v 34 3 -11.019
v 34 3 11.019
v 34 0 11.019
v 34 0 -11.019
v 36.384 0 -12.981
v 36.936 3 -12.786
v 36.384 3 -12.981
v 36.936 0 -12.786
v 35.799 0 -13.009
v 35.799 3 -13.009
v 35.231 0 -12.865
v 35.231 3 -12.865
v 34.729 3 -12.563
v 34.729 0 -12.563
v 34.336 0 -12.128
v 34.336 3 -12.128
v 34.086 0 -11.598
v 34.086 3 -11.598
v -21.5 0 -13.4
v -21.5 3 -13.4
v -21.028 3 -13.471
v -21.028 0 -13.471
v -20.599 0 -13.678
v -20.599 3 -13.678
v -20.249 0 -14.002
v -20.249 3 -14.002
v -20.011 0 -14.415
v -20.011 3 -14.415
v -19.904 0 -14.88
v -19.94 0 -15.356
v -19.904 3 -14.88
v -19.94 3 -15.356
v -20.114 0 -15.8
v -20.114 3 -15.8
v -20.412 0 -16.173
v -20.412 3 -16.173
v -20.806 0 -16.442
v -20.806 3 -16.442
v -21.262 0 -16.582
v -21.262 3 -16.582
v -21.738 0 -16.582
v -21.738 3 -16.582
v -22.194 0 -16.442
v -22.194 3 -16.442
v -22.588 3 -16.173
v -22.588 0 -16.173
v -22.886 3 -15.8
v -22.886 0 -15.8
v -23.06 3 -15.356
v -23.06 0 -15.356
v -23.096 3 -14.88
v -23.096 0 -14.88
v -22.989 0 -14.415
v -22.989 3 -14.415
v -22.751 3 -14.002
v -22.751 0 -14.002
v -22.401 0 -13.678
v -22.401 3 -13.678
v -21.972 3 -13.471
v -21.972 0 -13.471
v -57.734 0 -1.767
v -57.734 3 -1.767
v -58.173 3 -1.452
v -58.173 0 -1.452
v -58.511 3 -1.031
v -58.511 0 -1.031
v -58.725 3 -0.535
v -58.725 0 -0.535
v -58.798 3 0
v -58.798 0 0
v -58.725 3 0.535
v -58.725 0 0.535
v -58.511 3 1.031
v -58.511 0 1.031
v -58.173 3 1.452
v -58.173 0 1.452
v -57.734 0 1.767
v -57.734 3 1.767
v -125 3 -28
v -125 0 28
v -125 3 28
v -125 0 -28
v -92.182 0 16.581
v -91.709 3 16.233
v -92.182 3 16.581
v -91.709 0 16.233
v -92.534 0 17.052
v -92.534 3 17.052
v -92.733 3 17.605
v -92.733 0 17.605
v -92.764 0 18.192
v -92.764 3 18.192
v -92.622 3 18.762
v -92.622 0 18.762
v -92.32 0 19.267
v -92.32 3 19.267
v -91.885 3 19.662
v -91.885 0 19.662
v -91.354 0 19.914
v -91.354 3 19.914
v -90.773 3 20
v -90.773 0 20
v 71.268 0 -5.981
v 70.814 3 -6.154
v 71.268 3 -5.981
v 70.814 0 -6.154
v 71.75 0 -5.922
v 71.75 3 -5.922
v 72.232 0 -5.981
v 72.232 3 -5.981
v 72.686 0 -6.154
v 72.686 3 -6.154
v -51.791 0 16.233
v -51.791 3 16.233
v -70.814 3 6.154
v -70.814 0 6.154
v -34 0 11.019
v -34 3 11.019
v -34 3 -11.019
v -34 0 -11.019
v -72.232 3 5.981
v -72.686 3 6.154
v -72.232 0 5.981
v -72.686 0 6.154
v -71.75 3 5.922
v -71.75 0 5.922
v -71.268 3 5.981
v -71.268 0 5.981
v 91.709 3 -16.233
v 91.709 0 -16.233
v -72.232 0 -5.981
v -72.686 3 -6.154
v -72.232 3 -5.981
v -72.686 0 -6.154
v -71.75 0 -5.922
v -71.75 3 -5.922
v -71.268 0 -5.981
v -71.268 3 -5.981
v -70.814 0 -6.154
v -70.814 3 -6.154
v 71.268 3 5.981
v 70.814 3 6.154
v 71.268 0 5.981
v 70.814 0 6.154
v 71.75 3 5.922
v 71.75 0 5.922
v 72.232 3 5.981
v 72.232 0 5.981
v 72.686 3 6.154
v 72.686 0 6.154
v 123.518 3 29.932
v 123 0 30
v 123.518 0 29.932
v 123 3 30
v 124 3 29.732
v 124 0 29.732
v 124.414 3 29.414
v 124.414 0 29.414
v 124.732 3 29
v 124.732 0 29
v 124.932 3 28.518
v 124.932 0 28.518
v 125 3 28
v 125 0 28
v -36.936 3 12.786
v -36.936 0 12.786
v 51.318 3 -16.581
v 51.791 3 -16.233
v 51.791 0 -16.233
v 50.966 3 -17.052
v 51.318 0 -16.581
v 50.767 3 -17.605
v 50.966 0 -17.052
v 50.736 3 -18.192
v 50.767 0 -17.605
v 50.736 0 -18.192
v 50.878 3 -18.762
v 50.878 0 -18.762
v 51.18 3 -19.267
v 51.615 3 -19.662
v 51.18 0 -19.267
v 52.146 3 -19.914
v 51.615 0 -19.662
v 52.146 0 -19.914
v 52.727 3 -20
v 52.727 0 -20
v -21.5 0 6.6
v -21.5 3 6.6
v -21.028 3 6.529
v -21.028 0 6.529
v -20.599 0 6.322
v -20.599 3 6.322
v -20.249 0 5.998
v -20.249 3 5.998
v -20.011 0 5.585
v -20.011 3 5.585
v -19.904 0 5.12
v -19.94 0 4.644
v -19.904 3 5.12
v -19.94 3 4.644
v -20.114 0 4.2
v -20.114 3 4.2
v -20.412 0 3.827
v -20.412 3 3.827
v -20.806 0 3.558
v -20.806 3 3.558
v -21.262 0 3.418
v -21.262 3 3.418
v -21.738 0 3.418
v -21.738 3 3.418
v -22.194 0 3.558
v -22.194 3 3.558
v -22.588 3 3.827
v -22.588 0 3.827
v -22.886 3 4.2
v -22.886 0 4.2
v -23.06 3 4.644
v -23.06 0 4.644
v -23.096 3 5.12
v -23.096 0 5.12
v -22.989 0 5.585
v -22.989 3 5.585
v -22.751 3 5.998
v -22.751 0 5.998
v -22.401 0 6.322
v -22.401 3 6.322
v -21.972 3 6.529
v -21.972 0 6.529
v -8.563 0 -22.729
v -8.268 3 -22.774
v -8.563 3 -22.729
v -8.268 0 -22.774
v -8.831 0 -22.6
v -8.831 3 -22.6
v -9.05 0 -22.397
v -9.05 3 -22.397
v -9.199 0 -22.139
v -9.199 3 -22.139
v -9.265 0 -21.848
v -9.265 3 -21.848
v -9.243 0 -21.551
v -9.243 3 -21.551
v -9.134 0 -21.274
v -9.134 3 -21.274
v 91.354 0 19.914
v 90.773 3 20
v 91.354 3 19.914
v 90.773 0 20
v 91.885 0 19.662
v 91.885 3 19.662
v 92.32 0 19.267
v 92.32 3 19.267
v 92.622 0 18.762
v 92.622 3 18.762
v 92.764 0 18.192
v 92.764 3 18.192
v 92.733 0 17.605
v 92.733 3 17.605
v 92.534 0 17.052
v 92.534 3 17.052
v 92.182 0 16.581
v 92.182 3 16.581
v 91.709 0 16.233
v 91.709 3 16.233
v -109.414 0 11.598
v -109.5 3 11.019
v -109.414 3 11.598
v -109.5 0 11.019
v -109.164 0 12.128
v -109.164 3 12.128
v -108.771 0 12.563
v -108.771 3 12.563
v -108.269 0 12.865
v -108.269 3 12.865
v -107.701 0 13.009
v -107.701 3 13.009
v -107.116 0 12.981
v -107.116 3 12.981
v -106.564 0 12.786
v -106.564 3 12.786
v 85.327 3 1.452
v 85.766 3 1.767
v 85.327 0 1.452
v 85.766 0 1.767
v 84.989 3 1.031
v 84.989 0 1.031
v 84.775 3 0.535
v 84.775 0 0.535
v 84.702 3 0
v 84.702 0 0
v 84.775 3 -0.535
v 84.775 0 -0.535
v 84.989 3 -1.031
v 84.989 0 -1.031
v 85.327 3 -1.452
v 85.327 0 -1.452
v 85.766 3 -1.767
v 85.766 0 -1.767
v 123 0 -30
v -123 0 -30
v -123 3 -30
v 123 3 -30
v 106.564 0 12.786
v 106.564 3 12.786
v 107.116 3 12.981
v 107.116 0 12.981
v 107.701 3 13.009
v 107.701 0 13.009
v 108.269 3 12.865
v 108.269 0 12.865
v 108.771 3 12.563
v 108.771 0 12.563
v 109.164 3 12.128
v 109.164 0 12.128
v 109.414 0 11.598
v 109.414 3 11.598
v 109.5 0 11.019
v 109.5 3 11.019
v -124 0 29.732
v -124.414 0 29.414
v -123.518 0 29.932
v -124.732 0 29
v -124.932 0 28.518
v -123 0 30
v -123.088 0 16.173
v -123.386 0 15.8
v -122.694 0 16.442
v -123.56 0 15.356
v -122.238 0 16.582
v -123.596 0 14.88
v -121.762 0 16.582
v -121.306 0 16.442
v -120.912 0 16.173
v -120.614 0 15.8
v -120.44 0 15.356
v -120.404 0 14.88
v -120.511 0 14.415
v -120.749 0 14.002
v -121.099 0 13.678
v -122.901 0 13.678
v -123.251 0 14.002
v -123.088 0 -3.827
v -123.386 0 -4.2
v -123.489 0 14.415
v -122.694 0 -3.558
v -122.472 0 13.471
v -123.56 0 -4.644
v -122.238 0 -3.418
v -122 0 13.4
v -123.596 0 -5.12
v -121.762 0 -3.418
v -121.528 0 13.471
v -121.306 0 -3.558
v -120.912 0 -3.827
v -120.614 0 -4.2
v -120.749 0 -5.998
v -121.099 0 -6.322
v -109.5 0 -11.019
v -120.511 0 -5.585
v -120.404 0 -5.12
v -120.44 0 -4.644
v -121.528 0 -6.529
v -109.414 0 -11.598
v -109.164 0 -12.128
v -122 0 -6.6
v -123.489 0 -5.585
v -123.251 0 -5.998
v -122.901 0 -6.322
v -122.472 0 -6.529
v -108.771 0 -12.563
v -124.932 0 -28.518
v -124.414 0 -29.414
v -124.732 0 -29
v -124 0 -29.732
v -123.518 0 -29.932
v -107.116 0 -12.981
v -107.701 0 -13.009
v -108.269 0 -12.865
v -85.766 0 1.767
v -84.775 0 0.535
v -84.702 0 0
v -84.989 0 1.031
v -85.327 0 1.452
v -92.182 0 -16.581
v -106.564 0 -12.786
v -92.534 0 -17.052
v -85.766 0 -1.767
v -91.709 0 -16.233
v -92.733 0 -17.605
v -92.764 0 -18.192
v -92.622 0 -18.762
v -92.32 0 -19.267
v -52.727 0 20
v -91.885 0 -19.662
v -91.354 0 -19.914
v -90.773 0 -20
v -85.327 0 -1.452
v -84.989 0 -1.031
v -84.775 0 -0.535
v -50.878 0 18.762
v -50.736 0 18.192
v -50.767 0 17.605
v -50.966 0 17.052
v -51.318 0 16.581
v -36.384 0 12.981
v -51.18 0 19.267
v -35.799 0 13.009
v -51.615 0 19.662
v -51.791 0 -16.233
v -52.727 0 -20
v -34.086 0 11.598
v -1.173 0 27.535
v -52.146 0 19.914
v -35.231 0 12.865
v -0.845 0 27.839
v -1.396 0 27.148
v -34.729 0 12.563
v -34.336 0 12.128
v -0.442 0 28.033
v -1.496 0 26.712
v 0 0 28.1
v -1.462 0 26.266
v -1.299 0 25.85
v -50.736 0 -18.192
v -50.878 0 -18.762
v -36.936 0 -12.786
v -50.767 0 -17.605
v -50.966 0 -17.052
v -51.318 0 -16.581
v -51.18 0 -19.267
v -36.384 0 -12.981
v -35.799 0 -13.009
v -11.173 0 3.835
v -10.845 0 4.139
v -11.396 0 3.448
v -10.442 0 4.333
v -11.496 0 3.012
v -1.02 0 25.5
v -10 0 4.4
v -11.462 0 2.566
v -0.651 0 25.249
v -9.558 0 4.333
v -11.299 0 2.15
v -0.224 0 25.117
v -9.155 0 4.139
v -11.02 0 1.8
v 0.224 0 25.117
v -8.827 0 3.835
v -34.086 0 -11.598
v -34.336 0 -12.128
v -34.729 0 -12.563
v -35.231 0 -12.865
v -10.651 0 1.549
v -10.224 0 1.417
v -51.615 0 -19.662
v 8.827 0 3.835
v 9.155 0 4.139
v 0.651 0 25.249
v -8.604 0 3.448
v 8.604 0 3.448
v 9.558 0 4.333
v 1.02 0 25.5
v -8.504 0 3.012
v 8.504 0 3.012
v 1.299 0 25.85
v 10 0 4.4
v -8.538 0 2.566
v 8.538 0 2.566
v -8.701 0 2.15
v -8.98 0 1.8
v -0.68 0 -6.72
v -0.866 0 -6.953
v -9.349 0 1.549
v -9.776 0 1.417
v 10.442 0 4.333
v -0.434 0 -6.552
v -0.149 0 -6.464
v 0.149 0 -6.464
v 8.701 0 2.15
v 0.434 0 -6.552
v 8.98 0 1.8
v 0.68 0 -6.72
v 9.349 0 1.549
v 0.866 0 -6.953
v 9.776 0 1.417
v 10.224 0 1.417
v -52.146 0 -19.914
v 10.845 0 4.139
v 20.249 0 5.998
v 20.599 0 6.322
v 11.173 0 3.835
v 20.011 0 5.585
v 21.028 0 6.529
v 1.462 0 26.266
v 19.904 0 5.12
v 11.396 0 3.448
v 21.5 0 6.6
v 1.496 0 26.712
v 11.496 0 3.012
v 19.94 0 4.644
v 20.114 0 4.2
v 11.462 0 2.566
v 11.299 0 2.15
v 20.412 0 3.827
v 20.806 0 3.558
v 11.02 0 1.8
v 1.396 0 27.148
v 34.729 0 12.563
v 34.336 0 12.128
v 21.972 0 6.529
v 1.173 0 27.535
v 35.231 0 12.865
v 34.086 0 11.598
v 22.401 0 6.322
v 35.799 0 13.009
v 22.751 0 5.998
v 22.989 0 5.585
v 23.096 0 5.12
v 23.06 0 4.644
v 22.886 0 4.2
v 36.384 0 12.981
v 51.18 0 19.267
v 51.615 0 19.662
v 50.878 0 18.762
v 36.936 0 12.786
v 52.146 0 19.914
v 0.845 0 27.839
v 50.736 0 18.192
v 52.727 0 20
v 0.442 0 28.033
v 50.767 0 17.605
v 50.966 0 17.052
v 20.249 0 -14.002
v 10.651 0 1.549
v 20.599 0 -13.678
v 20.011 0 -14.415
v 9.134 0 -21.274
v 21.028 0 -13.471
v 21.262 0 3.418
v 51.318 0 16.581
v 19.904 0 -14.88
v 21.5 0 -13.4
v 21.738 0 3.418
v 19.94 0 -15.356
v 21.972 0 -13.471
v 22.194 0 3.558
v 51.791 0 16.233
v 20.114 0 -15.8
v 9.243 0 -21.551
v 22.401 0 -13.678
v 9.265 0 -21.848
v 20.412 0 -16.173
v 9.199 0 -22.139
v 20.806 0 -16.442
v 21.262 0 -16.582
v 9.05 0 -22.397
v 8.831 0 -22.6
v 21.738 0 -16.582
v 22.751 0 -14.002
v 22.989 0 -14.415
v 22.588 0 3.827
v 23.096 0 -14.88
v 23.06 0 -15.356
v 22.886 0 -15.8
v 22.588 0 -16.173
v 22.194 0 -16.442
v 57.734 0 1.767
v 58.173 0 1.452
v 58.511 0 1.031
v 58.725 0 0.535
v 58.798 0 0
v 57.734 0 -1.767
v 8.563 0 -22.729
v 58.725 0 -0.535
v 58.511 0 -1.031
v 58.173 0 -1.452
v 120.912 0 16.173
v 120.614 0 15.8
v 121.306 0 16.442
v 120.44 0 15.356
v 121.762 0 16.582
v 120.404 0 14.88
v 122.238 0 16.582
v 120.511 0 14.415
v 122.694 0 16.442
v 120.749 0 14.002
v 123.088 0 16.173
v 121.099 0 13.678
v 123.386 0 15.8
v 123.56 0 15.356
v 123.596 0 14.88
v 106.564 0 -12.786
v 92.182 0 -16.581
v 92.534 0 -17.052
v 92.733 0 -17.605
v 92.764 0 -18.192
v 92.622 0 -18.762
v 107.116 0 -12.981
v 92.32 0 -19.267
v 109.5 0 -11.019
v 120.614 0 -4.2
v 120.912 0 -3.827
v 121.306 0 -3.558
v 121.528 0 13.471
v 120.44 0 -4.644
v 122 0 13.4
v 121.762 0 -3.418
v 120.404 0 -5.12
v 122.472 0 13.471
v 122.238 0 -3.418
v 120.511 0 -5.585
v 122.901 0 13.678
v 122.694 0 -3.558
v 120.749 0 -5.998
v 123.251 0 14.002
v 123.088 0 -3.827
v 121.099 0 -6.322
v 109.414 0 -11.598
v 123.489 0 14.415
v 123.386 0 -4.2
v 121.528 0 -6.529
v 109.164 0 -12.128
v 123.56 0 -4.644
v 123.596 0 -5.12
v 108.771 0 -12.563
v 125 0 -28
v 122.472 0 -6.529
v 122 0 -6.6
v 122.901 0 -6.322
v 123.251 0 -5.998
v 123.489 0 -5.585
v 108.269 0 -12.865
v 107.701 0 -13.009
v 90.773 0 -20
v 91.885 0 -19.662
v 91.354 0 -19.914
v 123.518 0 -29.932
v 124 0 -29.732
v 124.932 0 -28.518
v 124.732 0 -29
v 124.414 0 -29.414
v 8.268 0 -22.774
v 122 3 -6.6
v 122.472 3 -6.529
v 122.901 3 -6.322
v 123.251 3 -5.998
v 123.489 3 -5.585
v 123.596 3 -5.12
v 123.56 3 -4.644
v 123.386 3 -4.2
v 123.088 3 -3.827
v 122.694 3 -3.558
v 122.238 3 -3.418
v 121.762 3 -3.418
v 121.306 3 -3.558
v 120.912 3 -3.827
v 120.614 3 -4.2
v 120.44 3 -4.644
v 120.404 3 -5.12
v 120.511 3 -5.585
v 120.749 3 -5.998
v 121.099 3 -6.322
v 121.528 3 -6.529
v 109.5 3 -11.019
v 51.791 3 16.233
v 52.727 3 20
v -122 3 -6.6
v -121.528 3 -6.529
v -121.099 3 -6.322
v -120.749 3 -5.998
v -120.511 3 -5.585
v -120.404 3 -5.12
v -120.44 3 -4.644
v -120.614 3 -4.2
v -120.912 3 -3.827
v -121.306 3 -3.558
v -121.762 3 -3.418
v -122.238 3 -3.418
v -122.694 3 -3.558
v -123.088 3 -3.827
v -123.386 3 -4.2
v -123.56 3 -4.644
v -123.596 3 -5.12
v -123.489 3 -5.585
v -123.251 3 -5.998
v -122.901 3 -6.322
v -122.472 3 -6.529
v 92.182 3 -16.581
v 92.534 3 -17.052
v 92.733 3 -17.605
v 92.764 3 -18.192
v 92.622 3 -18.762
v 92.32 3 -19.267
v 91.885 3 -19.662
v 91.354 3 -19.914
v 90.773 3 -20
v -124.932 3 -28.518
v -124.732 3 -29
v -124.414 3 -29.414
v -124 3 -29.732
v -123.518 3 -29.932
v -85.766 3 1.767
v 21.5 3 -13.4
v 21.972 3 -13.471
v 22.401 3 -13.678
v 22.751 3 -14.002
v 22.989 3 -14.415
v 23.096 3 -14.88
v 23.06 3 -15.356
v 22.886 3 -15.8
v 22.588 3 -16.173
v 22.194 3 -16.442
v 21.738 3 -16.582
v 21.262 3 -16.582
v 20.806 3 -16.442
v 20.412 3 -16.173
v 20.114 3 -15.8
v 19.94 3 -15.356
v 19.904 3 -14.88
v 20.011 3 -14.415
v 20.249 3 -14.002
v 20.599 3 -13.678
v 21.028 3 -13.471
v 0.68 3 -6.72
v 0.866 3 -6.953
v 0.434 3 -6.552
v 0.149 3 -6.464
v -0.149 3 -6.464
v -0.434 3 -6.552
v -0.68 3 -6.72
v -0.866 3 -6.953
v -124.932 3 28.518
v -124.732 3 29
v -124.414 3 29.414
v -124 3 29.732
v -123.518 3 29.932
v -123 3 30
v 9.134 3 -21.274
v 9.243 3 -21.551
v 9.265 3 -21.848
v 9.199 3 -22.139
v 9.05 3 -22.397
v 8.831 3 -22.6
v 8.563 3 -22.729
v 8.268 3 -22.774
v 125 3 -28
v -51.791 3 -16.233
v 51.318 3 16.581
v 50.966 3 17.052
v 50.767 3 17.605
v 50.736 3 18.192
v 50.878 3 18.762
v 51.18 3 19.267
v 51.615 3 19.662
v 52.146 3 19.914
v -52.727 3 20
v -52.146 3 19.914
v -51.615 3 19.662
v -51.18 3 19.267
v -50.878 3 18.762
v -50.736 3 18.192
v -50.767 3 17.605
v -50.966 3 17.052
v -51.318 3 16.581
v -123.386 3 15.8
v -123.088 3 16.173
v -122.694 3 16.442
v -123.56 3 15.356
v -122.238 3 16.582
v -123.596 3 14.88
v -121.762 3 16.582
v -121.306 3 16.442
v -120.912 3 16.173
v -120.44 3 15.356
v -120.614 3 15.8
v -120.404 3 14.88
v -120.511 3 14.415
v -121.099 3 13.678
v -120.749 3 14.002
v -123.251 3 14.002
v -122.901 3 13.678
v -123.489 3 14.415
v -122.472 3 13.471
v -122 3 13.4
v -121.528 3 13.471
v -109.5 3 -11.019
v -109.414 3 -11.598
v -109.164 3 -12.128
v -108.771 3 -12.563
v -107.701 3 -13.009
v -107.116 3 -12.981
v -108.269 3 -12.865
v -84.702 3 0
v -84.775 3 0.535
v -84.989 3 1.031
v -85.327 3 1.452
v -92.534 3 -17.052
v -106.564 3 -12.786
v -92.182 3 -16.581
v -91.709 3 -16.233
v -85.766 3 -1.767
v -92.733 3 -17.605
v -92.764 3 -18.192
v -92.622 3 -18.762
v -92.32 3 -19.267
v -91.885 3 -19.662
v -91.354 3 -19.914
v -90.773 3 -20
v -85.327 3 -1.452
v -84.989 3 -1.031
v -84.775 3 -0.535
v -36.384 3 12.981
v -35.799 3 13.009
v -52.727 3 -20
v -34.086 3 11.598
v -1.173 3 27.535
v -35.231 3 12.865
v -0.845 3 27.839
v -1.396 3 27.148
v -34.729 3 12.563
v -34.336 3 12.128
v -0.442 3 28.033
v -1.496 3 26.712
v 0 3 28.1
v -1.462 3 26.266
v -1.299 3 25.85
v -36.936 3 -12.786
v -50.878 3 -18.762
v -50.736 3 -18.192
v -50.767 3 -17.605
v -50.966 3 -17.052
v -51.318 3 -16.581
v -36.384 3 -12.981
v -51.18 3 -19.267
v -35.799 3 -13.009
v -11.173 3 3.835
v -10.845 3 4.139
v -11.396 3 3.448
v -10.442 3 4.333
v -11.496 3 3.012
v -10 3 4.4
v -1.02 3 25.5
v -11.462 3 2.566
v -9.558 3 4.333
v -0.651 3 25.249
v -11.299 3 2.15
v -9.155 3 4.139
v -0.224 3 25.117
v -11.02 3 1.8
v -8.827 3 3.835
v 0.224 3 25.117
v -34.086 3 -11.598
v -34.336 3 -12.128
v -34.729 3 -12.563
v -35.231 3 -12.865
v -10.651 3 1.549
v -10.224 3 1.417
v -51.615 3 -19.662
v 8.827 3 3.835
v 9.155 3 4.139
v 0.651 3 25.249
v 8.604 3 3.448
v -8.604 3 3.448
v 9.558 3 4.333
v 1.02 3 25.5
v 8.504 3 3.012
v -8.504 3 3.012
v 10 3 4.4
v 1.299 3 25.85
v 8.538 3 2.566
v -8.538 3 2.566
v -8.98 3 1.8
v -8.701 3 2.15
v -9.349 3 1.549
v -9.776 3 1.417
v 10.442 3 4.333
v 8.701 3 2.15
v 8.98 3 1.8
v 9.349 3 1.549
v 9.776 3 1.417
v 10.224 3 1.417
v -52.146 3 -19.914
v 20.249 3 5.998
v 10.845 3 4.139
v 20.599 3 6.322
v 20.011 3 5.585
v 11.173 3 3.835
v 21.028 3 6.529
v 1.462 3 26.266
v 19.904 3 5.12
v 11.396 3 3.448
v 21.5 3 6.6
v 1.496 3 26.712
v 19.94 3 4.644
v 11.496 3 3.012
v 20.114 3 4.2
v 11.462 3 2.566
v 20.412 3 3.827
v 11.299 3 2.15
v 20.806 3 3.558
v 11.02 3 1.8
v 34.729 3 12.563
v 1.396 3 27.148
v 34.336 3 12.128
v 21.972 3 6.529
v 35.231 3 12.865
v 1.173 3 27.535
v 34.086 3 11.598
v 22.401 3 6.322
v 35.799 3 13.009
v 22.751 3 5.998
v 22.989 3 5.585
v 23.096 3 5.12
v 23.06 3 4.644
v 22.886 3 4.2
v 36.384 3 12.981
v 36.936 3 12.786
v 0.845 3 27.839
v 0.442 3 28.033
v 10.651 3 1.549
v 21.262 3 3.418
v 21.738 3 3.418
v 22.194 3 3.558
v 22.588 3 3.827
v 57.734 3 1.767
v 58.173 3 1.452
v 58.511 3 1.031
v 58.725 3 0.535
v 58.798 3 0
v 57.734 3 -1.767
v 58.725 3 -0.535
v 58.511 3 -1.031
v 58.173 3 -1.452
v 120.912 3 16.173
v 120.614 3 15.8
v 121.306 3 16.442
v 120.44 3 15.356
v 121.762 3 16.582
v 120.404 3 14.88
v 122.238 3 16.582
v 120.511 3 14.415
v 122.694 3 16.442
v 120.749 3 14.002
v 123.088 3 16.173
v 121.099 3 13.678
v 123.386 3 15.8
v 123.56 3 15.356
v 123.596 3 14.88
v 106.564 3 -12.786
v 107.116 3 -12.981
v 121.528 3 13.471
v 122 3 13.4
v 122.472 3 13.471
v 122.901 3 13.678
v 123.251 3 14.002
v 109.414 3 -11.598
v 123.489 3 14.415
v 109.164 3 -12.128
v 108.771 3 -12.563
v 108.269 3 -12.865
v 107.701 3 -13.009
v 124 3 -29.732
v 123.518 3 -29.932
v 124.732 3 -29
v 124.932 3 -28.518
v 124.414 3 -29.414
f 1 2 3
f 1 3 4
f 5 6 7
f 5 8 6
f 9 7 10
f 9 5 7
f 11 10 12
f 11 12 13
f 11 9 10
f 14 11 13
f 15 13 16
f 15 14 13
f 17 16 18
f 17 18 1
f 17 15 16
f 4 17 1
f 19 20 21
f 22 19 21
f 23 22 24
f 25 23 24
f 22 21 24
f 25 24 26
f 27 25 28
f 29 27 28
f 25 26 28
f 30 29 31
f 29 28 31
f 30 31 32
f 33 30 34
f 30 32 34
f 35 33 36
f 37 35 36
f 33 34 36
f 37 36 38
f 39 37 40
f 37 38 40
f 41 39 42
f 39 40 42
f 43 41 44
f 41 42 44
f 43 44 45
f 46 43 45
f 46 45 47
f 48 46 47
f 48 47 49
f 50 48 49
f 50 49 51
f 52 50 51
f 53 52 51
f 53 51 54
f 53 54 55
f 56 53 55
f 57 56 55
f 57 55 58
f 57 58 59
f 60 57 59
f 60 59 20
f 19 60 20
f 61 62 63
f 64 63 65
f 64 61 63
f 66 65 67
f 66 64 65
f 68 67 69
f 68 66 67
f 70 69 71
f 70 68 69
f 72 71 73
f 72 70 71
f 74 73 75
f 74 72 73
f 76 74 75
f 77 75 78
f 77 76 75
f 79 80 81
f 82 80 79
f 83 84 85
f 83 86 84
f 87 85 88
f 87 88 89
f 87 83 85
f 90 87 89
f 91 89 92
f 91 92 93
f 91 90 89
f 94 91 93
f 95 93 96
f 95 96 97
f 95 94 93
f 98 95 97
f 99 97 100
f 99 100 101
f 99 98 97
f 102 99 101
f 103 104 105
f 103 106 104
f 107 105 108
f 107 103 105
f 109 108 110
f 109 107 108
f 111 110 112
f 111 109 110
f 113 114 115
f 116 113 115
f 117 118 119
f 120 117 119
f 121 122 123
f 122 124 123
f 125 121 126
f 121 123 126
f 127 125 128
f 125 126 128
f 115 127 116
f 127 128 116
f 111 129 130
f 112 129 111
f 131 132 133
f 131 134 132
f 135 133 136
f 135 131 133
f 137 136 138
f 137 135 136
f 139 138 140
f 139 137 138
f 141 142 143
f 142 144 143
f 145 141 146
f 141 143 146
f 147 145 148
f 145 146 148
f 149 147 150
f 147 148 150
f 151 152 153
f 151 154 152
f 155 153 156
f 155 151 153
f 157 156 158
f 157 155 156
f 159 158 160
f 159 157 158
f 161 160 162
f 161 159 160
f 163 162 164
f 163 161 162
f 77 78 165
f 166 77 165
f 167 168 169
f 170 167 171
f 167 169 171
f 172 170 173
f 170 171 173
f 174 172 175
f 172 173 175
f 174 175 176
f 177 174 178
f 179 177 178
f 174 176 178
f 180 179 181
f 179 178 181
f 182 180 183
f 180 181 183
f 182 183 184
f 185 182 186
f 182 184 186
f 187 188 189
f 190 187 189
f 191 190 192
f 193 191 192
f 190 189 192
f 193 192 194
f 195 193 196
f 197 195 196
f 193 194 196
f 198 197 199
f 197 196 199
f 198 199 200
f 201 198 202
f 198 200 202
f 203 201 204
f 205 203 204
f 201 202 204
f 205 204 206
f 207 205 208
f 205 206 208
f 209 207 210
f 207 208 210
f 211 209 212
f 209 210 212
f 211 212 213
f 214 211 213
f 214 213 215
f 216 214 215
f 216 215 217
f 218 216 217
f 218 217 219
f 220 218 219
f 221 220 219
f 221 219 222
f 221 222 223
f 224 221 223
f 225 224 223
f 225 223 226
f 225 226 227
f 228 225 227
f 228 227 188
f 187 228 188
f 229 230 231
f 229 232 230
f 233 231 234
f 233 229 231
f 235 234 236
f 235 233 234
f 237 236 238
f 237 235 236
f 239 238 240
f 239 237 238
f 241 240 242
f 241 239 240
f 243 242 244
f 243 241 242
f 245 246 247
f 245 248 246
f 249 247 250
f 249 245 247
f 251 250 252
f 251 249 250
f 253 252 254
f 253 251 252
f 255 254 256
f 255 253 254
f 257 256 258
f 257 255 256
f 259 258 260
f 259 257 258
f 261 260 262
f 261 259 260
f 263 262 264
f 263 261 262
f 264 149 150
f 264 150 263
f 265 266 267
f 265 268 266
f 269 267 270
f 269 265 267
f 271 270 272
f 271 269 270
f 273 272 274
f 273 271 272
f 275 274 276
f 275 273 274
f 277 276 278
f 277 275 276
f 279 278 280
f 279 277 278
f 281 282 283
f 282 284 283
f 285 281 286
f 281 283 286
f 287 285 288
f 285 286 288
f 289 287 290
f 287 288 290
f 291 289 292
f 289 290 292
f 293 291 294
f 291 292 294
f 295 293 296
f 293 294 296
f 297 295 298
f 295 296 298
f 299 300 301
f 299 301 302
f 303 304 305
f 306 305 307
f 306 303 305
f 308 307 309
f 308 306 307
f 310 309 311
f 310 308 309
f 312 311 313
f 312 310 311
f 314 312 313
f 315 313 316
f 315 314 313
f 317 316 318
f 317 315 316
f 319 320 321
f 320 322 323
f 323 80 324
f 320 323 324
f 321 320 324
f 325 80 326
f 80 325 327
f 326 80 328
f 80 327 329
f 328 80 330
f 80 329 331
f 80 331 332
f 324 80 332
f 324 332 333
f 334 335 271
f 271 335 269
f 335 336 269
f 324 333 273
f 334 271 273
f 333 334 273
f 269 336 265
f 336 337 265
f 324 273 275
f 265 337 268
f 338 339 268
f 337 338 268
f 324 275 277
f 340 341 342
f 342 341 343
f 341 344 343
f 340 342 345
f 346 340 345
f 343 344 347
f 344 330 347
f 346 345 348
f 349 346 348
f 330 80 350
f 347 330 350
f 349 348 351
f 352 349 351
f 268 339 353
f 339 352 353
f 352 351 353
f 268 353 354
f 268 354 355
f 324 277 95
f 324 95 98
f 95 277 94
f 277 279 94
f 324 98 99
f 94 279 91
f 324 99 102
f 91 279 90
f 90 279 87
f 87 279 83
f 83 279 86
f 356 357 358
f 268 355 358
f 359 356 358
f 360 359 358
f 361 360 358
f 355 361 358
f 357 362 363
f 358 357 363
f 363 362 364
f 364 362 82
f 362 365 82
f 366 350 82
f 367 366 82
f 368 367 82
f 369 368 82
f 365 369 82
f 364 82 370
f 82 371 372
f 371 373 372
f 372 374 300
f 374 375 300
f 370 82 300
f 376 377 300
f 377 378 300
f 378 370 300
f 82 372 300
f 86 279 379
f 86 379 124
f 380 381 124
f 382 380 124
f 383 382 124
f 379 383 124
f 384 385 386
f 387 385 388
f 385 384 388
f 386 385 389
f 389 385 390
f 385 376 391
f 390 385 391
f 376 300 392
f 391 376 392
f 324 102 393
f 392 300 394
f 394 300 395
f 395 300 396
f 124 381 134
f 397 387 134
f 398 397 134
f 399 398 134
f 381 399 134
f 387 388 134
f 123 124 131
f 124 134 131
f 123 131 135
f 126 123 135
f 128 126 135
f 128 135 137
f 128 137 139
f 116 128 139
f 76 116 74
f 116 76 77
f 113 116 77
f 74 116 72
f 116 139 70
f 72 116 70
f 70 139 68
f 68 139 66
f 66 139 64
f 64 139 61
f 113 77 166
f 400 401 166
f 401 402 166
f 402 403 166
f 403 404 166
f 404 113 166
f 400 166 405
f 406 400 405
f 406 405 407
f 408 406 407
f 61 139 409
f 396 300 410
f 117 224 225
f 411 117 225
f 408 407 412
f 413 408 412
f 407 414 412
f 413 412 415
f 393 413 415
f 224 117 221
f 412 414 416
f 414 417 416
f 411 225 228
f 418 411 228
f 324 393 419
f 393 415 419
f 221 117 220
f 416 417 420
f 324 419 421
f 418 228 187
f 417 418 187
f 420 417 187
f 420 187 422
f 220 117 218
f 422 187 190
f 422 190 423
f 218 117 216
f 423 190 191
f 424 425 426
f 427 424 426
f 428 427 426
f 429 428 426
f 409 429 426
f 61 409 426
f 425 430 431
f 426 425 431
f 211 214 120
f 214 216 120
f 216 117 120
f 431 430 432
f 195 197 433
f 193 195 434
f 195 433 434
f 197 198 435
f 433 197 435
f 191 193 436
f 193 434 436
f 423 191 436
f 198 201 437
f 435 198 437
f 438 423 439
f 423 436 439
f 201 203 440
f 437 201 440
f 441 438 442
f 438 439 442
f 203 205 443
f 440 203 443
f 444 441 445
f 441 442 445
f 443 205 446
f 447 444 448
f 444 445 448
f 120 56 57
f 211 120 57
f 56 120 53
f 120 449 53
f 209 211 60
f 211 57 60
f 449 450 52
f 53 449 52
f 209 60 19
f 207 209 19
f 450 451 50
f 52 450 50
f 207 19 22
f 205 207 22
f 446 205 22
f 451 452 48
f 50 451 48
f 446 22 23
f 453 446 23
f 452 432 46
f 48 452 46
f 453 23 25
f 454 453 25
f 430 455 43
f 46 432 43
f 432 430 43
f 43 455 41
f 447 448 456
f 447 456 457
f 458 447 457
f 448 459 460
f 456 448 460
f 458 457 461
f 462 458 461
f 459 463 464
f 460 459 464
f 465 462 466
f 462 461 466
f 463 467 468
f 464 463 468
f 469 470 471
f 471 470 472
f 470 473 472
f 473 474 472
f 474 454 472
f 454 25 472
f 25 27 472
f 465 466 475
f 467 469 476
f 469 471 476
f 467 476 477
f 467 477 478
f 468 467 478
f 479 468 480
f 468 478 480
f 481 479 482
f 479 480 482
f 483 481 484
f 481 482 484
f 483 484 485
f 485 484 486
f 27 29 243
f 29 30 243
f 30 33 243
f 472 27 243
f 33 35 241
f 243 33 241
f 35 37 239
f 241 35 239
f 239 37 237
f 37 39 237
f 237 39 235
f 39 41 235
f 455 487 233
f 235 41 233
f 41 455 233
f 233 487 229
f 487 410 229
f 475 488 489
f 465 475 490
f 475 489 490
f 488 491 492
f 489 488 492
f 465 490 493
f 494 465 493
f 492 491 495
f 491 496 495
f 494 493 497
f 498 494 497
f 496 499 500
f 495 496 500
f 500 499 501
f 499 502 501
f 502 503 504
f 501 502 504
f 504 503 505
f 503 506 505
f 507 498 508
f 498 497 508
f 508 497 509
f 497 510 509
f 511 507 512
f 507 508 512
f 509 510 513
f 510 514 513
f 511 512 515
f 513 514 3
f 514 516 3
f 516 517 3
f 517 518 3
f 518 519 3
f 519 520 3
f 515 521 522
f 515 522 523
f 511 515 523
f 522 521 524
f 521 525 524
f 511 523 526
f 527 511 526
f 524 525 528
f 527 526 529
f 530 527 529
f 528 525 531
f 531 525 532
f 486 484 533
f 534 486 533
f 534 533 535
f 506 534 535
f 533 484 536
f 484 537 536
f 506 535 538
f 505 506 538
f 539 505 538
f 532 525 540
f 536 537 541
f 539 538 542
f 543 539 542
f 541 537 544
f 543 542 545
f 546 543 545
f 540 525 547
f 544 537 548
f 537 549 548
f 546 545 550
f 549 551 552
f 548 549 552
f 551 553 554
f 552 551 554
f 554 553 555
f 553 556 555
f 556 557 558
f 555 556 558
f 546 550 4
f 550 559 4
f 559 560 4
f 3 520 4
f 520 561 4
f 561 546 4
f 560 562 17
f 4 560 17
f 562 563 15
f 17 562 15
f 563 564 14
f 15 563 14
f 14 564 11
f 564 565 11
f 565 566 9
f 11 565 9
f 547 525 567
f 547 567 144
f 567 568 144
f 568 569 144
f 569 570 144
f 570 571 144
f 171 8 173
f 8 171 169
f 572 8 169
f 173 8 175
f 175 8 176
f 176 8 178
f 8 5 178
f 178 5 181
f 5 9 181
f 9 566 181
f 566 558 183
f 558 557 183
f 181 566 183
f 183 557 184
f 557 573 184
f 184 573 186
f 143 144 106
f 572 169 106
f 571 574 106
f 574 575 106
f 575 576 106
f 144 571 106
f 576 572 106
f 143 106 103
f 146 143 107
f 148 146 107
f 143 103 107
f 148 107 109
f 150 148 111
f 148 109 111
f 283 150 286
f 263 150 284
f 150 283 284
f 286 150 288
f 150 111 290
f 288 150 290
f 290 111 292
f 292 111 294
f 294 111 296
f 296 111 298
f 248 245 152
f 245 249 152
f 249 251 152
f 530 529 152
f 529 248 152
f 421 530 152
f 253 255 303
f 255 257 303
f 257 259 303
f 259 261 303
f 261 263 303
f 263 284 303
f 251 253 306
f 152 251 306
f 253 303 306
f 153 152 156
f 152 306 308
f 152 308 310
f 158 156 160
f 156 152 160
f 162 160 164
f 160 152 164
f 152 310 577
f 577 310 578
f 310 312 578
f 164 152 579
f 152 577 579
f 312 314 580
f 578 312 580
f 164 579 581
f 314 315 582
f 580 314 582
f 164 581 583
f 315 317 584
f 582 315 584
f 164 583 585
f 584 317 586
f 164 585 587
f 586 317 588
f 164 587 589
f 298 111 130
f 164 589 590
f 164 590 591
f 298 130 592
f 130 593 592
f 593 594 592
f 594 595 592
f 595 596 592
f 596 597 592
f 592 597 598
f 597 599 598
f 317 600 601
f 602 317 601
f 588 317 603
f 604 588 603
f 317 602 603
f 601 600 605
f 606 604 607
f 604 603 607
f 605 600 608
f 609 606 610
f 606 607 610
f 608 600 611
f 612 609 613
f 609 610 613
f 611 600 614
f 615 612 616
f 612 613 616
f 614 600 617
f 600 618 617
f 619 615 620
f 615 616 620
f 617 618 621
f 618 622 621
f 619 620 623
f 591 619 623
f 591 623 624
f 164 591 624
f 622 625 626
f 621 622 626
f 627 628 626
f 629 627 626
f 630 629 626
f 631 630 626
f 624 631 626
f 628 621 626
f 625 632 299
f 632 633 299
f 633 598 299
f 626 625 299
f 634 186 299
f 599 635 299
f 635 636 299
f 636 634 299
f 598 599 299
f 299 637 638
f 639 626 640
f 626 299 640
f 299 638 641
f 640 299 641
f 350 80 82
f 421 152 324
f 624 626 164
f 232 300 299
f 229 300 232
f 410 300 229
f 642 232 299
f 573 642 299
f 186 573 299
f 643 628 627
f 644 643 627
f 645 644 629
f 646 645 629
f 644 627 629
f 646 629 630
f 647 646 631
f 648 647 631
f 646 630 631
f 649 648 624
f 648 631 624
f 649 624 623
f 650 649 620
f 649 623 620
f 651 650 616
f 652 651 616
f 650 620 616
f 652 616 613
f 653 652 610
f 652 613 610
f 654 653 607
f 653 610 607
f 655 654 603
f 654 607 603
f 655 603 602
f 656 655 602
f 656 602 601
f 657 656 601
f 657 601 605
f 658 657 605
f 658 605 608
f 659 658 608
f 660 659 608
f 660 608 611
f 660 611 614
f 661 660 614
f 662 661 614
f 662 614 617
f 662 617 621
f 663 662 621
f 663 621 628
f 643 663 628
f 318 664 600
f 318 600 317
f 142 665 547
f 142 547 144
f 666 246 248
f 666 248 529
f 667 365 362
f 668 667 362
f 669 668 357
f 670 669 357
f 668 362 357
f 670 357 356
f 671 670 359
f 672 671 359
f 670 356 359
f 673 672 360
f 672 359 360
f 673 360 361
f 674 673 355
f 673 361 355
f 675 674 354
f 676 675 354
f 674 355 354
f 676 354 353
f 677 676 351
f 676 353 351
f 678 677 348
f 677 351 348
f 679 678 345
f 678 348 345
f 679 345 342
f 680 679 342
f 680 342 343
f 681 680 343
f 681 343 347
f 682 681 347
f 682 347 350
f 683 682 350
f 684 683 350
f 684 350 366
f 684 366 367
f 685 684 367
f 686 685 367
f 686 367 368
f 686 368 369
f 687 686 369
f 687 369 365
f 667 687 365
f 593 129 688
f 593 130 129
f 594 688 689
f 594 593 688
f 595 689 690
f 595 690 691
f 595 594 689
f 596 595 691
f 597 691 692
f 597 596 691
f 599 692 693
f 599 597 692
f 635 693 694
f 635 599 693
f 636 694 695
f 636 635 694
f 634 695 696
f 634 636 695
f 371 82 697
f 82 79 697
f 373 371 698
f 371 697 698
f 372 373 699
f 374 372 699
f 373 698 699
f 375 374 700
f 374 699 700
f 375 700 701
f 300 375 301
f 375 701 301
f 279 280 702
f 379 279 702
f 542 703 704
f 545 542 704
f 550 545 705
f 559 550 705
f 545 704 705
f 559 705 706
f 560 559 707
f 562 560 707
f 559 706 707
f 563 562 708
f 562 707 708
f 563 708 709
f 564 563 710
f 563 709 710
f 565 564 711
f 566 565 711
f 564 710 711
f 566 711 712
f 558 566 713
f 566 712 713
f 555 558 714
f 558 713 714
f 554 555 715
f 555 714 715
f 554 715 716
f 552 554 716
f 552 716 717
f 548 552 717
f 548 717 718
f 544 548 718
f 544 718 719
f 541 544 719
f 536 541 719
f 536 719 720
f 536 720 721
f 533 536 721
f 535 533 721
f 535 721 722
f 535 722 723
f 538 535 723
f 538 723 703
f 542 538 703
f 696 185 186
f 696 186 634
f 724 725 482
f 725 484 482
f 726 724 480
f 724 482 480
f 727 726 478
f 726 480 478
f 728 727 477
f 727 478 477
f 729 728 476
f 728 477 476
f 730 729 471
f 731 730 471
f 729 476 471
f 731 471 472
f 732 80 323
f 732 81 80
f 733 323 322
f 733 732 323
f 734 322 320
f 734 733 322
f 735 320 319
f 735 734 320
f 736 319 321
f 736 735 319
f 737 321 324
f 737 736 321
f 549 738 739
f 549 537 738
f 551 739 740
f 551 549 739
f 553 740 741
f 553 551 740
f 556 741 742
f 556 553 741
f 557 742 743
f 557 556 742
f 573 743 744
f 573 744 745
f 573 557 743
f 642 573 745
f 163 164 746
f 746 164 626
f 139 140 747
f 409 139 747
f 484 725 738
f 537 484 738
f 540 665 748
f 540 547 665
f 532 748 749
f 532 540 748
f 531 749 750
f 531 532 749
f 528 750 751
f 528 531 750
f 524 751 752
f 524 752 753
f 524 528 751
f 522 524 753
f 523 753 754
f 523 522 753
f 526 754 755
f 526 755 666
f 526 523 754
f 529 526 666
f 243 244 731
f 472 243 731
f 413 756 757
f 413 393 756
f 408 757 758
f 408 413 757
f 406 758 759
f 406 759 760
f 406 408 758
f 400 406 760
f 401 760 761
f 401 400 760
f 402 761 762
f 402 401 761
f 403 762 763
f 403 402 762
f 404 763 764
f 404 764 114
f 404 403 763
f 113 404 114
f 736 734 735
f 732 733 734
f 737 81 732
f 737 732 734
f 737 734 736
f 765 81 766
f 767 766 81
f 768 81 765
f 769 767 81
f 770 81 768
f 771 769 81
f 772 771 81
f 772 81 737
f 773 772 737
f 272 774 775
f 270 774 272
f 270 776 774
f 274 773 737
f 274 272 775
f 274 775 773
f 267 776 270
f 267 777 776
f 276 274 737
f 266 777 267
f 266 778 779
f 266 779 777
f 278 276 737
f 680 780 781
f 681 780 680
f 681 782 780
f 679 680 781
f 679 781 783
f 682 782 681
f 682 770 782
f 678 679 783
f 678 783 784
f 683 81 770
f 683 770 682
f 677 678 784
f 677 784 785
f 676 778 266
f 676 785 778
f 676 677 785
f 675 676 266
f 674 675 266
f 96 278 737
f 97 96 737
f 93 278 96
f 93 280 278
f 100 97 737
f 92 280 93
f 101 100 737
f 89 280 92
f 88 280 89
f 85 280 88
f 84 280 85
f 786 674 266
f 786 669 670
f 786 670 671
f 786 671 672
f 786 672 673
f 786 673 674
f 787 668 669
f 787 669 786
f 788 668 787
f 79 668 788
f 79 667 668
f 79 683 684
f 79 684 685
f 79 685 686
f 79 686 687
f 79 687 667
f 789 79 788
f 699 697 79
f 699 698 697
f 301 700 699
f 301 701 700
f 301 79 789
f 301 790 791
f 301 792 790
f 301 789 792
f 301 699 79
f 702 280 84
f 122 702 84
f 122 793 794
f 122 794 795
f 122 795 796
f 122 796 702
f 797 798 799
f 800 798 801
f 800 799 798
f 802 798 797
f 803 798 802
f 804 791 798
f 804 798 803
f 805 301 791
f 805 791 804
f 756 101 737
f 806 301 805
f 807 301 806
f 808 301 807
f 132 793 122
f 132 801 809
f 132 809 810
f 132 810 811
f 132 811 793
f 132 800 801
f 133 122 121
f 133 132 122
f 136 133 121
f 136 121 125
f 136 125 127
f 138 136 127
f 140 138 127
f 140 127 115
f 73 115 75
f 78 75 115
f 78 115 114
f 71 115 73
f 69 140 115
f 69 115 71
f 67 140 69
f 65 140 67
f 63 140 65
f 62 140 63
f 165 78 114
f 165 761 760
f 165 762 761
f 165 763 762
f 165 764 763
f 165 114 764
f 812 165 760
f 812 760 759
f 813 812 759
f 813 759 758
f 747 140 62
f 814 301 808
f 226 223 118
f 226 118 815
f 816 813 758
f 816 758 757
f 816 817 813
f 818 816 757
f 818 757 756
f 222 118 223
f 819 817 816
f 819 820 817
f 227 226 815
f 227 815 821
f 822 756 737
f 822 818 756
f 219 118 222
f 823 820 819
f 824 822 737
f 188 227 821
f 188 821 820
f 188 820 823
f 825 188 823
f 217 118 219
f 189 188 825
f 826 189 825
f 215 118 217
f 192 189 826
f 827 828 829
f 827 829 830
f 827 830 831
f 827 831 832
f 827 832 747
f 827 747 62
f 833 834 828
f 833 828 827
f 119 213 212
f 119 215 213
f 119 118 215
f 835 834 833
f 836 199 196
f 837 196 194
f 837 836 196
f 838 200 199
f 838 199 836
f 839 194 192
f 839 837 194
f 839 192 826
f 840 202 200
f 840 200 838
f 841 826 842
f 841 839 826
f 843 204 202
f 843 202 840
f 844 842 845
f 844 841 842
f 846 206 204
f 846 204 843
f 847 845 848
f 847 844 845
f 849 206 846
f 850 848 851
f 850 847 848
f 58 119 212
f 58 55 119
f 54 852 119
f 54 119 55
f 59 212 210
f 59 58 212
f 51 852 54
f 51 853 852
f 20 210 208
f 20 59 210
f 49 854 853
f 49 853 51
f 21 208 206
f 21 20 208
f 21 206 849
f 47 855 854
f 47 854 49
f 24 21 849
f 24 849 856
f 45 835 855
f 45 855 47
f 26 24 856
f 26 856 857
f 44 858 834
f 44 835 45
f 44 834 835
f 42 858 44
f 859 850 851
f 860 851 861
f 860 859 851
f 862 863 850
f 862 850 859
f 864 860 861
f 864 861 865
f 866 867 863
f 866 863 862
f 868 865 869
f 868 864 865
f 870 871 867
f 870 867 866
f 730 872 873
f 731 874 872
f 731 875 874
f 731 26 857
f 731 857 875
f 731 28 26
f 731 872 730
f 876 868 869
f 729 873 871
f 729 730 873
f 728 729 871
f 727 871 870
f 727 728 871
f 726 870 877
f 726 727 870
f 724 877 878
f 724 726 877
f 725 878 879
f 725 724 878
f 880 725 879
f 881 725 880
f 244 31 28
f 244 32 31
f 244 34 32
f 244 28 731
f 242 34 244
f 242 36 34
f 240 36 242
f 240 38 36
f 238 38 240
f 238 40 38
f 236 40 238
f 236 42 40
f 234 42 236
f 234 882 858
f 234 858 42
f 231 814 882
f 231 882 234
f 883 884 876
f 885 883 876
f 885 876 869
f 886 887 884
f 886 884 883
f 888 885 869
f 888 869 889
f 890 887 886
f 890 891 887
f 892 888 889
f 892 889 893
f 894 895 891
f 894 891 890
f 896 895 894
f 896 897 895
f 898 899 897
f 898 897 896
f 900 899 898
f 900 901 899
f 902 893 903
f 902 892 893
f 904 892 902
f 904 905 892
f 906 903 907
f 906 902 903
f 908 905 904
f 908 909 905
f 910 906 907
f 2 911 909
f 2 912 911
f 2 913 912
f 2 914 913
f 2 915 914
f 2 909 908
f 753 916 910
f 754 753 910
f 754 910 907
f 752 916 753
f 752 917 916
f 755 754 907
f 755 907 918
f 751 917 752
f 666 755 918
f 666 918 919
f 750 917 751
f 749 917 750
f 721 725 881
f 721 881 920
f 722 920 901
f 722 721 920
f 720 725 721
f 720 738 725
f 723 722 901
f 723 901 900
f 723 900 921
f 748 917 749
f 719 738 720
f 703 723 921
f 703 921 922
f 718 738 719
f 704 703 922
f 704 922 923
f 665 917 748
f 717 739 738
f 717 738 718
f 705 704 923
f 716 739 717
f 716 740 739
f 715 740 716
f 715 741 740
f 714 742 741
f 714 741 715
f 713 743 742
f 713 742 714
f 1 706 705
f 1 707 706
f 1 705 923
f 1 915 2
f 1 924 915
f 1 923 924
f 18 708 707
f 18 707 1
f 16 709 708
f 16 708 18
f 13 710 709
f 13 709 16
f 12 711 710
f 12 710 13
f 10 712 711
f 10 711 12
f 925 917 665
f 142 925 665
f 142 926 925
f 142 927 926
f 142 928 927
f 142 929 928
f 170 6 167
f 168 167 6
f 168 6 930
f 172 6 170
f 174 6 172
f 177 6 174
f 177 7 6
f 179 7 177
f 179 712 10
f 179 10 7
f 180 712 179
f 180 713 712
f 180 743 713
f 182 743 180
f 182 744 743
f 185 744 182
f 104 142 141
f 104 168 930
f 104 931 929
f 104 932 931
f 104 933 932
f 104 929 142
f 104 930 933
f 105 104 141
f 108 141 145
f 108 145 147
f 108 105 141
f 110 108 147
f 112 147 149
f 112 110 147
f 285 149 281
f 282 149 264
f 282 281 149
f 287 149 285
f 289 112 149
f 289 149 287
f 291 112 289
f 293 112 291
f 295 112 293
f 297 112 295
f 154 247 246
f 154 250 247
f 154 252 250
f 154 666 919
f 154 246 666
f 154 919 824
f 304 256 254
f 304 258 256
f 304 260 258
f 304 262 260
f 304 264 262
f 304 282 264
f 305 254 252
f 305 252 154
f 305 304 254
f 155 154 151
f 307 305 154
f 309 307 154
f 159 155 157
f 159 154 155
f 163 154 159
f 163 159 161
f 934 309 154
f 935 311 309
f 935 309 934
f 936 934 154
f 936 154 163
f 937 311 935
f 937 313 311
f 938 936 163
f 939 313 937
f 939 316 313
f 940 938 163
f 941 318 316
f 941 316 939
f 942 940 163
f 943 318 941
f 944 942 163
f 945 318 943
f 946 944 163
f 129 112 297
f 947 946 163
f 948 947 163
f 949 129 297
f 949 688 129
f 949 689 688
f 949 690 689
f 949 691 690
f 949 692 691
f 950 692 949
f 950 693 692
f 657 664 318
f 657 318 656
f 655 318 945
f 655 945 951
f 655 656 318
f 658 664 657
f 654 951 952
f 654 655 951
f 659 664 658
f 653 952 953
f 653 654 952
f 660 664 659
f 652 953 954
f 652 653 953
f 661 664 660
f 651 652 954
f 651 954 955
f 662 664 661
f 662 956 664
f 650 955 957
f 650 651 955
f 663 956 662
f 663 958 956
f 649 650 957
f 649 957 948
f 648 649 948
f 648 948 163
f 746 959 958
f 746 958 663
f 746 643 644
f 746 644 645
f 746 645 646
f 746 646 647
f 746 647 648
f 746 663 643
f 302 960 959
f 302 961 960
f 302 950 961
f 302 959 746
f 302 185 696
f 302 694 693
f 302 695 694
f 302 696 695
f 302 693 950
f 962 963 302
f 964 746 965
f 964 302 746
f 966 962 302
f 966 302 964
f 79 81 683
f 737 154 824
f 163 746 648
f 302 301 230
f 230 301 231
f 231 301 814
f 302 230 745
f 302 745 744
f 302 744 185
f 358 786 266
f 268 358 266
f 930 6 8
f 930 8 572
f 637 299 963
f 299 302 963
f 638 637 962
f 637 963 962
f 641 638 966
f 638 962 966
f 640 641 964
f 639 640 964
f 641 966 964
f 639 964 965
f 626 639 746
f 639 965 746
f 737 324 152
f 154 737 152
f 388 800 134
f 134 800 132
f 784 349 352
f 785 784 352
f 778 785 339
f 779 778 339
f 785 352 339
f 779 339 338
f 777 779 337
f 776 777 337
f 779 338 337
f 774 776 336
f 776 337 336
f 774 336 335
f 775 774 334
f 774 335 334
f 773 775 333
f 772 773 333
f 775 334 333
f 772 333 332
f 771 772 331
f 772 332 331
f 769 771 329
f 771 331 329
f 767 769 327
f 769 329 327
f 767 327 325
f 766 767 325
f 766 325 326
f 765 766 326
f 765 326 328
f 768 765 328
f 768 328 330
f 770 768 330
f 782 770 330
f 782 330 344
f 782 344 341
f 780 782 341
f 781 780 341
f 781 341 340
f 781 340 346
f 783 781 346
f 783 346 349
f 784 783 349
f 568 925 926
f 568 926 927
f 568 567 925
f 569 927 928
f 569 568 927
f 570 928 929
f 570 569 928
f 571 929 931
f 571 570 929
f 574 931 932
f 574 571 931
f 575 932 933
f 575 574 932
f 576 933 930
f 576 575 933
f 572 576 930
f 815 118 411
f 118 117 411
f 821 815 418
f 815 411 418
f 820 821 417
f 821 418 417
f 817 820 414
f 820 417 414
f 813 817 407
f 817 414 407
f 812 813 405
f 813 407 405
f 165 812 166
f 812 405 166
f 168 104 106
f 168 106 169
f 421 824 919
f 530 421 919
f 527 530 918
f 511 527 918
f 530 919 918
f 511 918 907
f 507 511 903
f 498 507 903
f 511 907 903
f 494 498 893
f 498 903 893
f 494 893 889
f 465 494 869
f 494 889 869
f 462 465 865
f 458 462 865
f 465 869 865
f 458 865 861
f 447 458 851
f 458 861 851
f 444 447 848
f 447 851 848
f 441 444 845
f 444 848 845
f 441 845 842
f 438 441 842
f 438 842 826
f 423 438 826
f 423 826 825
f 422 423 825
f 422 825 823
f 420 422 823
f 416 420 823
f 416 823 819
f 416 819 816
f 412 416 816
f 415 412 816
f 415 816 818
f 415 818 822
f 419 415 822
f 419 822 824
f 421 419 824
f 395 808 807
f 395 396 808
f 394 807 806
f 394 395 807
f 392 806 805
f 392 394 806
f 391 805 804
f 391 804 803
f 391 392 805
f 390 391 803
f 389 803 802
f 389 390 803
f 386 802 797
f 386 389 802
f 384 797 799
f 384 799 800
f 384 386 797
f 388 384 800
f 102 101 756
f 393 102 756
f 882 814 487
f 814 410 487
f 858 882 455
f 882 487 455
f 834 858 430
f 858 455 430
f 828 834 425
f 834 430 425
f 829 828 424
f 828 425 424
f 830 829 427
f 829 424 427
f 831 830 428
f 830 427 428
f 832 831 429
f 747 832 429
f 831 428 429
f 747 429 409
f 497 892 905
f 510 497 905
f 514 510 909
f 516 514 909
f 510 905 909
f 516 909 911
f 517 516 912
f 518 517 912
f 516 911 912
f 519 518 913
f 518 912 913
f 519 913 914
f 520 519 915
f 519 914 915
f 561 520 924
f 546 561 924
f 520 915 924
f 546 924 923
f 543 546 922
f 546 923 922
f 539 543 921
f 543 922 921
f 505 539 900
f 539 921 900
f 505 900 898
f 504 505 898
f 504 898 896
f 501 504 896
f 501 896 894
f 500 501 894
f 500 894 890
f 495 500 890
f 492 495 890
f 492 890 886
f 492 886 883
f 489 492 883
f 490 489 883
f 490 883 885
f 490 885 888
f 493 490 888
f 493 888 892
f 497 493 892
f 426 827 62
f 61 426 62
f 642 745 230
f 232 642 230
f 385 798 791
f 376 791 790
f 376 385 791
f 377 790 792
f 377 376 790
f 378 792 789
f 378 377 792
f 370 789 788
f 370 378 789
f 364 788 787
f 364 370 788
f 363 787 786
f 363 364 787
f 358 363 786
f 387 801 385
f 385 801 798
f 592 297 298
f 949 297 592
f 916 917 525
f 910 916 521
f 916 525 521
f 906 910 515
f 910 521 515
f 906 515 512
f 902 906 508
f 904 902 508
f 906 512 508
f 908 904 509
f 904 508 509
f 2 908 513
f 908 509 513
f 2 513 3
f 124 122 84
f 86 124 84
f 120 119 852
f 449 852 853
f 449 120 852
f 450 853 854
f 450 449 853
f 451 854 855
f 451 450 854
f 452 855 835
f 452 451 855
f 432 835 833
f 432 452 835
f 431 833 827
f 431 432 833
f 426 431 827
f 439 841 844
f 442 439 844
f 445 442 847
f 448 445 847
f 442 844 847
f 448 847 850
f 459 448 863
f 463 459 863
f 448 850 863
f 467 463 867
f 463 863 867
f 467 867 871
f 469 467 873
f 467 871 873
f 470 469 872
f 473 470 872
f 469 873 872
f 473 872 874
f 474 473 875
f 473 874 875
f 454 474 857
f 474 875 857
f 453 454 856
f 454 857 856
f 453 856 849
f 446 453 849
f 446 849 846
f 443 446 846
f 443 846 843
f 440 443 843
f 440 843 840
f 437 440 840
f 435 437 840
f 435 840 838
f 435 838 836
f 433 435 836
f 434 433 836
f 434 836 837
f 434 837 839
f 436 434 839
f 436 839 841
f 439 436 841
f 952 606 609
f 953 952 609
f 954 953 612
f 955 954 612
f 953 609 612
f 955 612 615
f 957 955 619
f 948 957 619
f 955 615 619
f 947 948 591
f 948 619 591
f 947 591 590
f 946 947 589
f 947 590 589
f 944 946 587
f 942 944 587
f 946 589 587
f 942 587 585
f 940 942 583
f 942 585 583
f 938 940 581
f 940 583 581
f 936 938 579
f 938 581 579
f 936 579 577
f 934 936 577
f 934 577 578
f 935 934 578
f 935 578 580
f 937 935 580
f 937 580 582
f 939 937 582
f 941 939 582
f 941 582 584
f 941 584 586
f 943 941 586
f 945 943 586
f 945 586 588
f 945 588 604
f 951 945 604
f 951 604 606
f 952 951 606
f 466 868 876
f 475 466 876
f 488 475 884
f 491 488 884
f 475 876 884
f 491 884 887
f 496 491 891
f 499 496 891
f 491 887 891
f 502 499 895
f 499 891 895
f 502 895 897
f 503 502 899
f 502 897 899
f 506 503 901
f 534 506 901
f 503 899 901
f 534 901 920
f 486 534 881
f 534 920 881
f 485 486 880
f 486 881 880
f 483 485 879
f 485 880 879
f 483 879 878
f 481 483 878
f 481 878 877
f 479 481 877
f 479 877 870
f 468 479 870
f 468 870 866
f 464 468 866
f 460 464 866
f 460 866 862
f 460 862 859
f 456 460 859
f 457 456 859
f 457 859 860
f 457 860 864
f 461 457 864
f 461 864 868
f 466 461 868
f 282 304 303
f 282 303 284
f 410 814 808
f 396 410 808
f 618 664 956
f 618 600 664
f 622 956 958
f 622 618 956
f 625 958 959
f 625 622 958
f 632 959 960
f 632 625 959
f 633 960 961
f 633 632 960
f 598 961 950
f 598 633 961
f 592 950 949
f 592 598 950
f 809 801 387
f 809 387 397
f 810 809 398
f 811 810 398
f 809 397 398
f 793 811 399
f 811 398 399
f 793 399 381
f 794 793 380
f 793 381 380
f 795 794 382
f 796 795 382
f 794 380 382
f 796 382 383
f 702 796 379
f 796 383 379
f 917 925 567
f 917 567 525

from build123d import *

# Parameters (mm, degrees)
SKETCH_1_W             = 250
SKETCH_1_H             = 60
EXTRUDE_1_DEPTH        = 3
SKETCH_2_R             = 1.5
CUT_EXTRUDE_1_DEPTH    = 129.5846025
SKETCH_3_R             = 1.6
CUT_EXTRUDE_2_DEPTH    = 129.5846025
SKETCH_4_R             = 1.6
CUT_EXTRUDE_3_DEPTH    = 129.5846025
FILLET_1_R             = 2
CUT_EXTRUDE_4_DEPTH    = 129.5846025
FILLET_2_R             = 2
FILLET_2_OF_MIRROR_1_R = 2
CUT_EXTRUDE_5_DEPTH    = 129.5846025
FILLET_3_R             = 1


with BuildPart() as part:
    # 草图1 → 凸台-拉伸1 (new body)
    with BuildSketch(Plane(origin=(0, 0, 0), x_dir=(1, 0, 0), z_dir=(0, 1, 0))):
        Rectangle(SKETCH_1_W, SKETCH_1_H)
    extrude(amount=EXTRUDE_1_DEPTH)

    # 草图2 → 切除-拉伸1 (cut, through all)
    with BuildSketch(Plane(origin=(0, 3, 0), x_dir=(1, 0, 0), z_dir=(0, 1, 0))):
        with Locations(Location((0, -26.6, 0), (0, 0, 270))):
            Circle(SKETCH_2_R)
        with Locations(Location((10, -2.9, 0), (0, 0, 270))):
            Circle(SKETCH_2_R)
        with Locations(Location((-10, -2.9, 0), (0, 0, 270))):
            Circle(SKETCH_2_R)
    extrude(amount=-CUT_EXTRUDE_1_DEPTH, mode=Mode.SUBTRACT)

    # 草图3 → 切除-拉伸2 (cut, through all)
    with BuildSketch(Plane.XZ):
        with Locations(Location((122, 15, 0), (0, 0, 270))):
            Circle(SKETCH_3_R)
        with Locations(Location((122, -5, 0), (0, 0, 270))):
            Circle(SKETCH_3_R)
        with Locations(Location((-122, 15, 0), (0, 0, 270))):
            Circle(SKETCH_3_R)
        with Locations(Location((-122, -5, 0), (0, 0, 270))):
            Circle(SKETCH_3_R)
    extrude(amount=-CUT_EXTRUDE_2_DEPTH, mode=Mode.SUBTRACT)

    # 草图4 → 切除-拉伸3 (cut, through all)
    with BuildSketch(Plane(origin=(0, 3, 0), x_dir=(1, 0, 0), z_dir=(0, 1, 0))):
        with Locations(Location((-21.5, -5, 0), (0, 0, 270))):
            Circle(SKETCH_4_R)
        with Locations(Location((-21.5, 15, 0), (0, 0, 270))):
            Circle(SKETCH_4_R)
        with Locations(Location((21.5, -5, 0), (0, 0, 270))):
            Circle(SKETCH_4_R)
        with Locations(Location((21.5, 15, 0), (0, 0, 270))):
            Circle(SKETCH_4_R)
    extrude(amount=-CUT_EXTRUDE_3_DEPTH, mode=Mode.SUBTRACT)

    # 圆角1
    fillet_1_edges = [part.edges().sort_by_distance(p)[0] for p in [
        (125, 1.5, 30),
        (-125, 1.5, 30),
        (-125, 1.5, -30),
        (125, 1.5, -30),
    ]]
    fillet(fillet_1_edges, radius=FILLET_1_R)

    # 草图5 → 切除-拉伸4 (cut, through all)
    with BuildSketch(Plane(origin=(0, 3, 0), x_dir=(1, 0, 0), z_dir=(0, 1, 0))):
        Polygon((-44.680187557, 20), (-98.819812443, 20), (-71.75, 5.658377514), align=None)
        Polygon((-34, -14.341622486), (-34, 14.341622486), (-61.069812443, 0), align=None)
        Polygon((-71.75, -5.658377514), (-98.819812443, -20), (-44.680187557, -20), align=None)
        Polygon((-82.430187557, 0), (-109.5, 14.341622486), (-109.5, -14.341622486), align=None)
    cut_extrude_4 = extrude(amount=-CUT_EXTRUDE_4_DEPTH, mode=Mode.SUBTRACT)

    # 圆角2
    fillet_2_edges = [part.edges().sort_by_distance(p)[0] for p in [
        (-71.75, 1.5, 5.658377514),
        (-44.680187557, 1.5, 20),
        (-98.819812443, 1.5, 20),
        (-61.069812443, 1.5, 0),
        (-34, 1.5, -14.341622486),
        (-34, 1.5, 14.341622486),
        (-109.5, 1.5, -14.341622486),
        (-82.430187557, 1.5, 0),
        (-109.5, 1.5, 14.341622486),
        (-98.819812443, 1.5, -20),
        (-44.680187557, 1.5, -20),
        (-71.75, 1.5, -5.658377514),
    ]]
    fillet(fillet_2_edges, radius=FILLET_2_R)

    # 镜向1: 切除-拉伸4 across plane
    add(cut_extrude_4.mirror(Plane.ZY), mode=Mode.SUBTRACT)

    # 圆角2 of 镜向1
    fillet_2_of_mirror_1_edges = [part.edges().sort_by_distance(p)[0] for p in [
        (71.75, 1.5, 5.658377514),
        (44.680187557, 1.5, 20),
        (98.819812443, 1.5, 20),
        (61.069812443, 1.5, 0),
        (34, 1.5, -14.341622486),
        (34, 1.5, 14.341622486),
        (109.5, 1.5, -14.341622486),
        (82.430187557, 1.5, 0),
        (109.5, 1.5, 14.341622486),
        (98.819812443, 1.5, -20),
        (44.680187557, 1.5, -20),
        (71.75, 1.5, -5.658377514),
    ]]
    fillet(fillet_2_of_mirror_1_edges, radius=FILLET_2_OF_MIRROR_1_R)

    # 草图6 → 切除-拉伸5 (cut, through all)
    with BuildSketch(Plane(origin=(0, 3, 0), x_dir=(1, 0, 0), z_dir=(0, 1, 0))):
        Polygon((0, 5.452994616), (10, 22.773502692), (-10, 22.773502692), align=None)
    extrude(amount=-CUT_EXTRUDE_5_DEPTH, mode=Mode.SUBTRACT)

    # 圆角3
    fillet_3_edges = [part.edges().sort_by_distance(p)[0] for p in [
        (0, 1.5, -5.452994616),
        (-10, 1.5, -22.773502692),
        (10, 1.5, -22.773502692),
    ]]
    fillet(fillet_3_edges, radius=FILLET_3_R)


solid = part.part
